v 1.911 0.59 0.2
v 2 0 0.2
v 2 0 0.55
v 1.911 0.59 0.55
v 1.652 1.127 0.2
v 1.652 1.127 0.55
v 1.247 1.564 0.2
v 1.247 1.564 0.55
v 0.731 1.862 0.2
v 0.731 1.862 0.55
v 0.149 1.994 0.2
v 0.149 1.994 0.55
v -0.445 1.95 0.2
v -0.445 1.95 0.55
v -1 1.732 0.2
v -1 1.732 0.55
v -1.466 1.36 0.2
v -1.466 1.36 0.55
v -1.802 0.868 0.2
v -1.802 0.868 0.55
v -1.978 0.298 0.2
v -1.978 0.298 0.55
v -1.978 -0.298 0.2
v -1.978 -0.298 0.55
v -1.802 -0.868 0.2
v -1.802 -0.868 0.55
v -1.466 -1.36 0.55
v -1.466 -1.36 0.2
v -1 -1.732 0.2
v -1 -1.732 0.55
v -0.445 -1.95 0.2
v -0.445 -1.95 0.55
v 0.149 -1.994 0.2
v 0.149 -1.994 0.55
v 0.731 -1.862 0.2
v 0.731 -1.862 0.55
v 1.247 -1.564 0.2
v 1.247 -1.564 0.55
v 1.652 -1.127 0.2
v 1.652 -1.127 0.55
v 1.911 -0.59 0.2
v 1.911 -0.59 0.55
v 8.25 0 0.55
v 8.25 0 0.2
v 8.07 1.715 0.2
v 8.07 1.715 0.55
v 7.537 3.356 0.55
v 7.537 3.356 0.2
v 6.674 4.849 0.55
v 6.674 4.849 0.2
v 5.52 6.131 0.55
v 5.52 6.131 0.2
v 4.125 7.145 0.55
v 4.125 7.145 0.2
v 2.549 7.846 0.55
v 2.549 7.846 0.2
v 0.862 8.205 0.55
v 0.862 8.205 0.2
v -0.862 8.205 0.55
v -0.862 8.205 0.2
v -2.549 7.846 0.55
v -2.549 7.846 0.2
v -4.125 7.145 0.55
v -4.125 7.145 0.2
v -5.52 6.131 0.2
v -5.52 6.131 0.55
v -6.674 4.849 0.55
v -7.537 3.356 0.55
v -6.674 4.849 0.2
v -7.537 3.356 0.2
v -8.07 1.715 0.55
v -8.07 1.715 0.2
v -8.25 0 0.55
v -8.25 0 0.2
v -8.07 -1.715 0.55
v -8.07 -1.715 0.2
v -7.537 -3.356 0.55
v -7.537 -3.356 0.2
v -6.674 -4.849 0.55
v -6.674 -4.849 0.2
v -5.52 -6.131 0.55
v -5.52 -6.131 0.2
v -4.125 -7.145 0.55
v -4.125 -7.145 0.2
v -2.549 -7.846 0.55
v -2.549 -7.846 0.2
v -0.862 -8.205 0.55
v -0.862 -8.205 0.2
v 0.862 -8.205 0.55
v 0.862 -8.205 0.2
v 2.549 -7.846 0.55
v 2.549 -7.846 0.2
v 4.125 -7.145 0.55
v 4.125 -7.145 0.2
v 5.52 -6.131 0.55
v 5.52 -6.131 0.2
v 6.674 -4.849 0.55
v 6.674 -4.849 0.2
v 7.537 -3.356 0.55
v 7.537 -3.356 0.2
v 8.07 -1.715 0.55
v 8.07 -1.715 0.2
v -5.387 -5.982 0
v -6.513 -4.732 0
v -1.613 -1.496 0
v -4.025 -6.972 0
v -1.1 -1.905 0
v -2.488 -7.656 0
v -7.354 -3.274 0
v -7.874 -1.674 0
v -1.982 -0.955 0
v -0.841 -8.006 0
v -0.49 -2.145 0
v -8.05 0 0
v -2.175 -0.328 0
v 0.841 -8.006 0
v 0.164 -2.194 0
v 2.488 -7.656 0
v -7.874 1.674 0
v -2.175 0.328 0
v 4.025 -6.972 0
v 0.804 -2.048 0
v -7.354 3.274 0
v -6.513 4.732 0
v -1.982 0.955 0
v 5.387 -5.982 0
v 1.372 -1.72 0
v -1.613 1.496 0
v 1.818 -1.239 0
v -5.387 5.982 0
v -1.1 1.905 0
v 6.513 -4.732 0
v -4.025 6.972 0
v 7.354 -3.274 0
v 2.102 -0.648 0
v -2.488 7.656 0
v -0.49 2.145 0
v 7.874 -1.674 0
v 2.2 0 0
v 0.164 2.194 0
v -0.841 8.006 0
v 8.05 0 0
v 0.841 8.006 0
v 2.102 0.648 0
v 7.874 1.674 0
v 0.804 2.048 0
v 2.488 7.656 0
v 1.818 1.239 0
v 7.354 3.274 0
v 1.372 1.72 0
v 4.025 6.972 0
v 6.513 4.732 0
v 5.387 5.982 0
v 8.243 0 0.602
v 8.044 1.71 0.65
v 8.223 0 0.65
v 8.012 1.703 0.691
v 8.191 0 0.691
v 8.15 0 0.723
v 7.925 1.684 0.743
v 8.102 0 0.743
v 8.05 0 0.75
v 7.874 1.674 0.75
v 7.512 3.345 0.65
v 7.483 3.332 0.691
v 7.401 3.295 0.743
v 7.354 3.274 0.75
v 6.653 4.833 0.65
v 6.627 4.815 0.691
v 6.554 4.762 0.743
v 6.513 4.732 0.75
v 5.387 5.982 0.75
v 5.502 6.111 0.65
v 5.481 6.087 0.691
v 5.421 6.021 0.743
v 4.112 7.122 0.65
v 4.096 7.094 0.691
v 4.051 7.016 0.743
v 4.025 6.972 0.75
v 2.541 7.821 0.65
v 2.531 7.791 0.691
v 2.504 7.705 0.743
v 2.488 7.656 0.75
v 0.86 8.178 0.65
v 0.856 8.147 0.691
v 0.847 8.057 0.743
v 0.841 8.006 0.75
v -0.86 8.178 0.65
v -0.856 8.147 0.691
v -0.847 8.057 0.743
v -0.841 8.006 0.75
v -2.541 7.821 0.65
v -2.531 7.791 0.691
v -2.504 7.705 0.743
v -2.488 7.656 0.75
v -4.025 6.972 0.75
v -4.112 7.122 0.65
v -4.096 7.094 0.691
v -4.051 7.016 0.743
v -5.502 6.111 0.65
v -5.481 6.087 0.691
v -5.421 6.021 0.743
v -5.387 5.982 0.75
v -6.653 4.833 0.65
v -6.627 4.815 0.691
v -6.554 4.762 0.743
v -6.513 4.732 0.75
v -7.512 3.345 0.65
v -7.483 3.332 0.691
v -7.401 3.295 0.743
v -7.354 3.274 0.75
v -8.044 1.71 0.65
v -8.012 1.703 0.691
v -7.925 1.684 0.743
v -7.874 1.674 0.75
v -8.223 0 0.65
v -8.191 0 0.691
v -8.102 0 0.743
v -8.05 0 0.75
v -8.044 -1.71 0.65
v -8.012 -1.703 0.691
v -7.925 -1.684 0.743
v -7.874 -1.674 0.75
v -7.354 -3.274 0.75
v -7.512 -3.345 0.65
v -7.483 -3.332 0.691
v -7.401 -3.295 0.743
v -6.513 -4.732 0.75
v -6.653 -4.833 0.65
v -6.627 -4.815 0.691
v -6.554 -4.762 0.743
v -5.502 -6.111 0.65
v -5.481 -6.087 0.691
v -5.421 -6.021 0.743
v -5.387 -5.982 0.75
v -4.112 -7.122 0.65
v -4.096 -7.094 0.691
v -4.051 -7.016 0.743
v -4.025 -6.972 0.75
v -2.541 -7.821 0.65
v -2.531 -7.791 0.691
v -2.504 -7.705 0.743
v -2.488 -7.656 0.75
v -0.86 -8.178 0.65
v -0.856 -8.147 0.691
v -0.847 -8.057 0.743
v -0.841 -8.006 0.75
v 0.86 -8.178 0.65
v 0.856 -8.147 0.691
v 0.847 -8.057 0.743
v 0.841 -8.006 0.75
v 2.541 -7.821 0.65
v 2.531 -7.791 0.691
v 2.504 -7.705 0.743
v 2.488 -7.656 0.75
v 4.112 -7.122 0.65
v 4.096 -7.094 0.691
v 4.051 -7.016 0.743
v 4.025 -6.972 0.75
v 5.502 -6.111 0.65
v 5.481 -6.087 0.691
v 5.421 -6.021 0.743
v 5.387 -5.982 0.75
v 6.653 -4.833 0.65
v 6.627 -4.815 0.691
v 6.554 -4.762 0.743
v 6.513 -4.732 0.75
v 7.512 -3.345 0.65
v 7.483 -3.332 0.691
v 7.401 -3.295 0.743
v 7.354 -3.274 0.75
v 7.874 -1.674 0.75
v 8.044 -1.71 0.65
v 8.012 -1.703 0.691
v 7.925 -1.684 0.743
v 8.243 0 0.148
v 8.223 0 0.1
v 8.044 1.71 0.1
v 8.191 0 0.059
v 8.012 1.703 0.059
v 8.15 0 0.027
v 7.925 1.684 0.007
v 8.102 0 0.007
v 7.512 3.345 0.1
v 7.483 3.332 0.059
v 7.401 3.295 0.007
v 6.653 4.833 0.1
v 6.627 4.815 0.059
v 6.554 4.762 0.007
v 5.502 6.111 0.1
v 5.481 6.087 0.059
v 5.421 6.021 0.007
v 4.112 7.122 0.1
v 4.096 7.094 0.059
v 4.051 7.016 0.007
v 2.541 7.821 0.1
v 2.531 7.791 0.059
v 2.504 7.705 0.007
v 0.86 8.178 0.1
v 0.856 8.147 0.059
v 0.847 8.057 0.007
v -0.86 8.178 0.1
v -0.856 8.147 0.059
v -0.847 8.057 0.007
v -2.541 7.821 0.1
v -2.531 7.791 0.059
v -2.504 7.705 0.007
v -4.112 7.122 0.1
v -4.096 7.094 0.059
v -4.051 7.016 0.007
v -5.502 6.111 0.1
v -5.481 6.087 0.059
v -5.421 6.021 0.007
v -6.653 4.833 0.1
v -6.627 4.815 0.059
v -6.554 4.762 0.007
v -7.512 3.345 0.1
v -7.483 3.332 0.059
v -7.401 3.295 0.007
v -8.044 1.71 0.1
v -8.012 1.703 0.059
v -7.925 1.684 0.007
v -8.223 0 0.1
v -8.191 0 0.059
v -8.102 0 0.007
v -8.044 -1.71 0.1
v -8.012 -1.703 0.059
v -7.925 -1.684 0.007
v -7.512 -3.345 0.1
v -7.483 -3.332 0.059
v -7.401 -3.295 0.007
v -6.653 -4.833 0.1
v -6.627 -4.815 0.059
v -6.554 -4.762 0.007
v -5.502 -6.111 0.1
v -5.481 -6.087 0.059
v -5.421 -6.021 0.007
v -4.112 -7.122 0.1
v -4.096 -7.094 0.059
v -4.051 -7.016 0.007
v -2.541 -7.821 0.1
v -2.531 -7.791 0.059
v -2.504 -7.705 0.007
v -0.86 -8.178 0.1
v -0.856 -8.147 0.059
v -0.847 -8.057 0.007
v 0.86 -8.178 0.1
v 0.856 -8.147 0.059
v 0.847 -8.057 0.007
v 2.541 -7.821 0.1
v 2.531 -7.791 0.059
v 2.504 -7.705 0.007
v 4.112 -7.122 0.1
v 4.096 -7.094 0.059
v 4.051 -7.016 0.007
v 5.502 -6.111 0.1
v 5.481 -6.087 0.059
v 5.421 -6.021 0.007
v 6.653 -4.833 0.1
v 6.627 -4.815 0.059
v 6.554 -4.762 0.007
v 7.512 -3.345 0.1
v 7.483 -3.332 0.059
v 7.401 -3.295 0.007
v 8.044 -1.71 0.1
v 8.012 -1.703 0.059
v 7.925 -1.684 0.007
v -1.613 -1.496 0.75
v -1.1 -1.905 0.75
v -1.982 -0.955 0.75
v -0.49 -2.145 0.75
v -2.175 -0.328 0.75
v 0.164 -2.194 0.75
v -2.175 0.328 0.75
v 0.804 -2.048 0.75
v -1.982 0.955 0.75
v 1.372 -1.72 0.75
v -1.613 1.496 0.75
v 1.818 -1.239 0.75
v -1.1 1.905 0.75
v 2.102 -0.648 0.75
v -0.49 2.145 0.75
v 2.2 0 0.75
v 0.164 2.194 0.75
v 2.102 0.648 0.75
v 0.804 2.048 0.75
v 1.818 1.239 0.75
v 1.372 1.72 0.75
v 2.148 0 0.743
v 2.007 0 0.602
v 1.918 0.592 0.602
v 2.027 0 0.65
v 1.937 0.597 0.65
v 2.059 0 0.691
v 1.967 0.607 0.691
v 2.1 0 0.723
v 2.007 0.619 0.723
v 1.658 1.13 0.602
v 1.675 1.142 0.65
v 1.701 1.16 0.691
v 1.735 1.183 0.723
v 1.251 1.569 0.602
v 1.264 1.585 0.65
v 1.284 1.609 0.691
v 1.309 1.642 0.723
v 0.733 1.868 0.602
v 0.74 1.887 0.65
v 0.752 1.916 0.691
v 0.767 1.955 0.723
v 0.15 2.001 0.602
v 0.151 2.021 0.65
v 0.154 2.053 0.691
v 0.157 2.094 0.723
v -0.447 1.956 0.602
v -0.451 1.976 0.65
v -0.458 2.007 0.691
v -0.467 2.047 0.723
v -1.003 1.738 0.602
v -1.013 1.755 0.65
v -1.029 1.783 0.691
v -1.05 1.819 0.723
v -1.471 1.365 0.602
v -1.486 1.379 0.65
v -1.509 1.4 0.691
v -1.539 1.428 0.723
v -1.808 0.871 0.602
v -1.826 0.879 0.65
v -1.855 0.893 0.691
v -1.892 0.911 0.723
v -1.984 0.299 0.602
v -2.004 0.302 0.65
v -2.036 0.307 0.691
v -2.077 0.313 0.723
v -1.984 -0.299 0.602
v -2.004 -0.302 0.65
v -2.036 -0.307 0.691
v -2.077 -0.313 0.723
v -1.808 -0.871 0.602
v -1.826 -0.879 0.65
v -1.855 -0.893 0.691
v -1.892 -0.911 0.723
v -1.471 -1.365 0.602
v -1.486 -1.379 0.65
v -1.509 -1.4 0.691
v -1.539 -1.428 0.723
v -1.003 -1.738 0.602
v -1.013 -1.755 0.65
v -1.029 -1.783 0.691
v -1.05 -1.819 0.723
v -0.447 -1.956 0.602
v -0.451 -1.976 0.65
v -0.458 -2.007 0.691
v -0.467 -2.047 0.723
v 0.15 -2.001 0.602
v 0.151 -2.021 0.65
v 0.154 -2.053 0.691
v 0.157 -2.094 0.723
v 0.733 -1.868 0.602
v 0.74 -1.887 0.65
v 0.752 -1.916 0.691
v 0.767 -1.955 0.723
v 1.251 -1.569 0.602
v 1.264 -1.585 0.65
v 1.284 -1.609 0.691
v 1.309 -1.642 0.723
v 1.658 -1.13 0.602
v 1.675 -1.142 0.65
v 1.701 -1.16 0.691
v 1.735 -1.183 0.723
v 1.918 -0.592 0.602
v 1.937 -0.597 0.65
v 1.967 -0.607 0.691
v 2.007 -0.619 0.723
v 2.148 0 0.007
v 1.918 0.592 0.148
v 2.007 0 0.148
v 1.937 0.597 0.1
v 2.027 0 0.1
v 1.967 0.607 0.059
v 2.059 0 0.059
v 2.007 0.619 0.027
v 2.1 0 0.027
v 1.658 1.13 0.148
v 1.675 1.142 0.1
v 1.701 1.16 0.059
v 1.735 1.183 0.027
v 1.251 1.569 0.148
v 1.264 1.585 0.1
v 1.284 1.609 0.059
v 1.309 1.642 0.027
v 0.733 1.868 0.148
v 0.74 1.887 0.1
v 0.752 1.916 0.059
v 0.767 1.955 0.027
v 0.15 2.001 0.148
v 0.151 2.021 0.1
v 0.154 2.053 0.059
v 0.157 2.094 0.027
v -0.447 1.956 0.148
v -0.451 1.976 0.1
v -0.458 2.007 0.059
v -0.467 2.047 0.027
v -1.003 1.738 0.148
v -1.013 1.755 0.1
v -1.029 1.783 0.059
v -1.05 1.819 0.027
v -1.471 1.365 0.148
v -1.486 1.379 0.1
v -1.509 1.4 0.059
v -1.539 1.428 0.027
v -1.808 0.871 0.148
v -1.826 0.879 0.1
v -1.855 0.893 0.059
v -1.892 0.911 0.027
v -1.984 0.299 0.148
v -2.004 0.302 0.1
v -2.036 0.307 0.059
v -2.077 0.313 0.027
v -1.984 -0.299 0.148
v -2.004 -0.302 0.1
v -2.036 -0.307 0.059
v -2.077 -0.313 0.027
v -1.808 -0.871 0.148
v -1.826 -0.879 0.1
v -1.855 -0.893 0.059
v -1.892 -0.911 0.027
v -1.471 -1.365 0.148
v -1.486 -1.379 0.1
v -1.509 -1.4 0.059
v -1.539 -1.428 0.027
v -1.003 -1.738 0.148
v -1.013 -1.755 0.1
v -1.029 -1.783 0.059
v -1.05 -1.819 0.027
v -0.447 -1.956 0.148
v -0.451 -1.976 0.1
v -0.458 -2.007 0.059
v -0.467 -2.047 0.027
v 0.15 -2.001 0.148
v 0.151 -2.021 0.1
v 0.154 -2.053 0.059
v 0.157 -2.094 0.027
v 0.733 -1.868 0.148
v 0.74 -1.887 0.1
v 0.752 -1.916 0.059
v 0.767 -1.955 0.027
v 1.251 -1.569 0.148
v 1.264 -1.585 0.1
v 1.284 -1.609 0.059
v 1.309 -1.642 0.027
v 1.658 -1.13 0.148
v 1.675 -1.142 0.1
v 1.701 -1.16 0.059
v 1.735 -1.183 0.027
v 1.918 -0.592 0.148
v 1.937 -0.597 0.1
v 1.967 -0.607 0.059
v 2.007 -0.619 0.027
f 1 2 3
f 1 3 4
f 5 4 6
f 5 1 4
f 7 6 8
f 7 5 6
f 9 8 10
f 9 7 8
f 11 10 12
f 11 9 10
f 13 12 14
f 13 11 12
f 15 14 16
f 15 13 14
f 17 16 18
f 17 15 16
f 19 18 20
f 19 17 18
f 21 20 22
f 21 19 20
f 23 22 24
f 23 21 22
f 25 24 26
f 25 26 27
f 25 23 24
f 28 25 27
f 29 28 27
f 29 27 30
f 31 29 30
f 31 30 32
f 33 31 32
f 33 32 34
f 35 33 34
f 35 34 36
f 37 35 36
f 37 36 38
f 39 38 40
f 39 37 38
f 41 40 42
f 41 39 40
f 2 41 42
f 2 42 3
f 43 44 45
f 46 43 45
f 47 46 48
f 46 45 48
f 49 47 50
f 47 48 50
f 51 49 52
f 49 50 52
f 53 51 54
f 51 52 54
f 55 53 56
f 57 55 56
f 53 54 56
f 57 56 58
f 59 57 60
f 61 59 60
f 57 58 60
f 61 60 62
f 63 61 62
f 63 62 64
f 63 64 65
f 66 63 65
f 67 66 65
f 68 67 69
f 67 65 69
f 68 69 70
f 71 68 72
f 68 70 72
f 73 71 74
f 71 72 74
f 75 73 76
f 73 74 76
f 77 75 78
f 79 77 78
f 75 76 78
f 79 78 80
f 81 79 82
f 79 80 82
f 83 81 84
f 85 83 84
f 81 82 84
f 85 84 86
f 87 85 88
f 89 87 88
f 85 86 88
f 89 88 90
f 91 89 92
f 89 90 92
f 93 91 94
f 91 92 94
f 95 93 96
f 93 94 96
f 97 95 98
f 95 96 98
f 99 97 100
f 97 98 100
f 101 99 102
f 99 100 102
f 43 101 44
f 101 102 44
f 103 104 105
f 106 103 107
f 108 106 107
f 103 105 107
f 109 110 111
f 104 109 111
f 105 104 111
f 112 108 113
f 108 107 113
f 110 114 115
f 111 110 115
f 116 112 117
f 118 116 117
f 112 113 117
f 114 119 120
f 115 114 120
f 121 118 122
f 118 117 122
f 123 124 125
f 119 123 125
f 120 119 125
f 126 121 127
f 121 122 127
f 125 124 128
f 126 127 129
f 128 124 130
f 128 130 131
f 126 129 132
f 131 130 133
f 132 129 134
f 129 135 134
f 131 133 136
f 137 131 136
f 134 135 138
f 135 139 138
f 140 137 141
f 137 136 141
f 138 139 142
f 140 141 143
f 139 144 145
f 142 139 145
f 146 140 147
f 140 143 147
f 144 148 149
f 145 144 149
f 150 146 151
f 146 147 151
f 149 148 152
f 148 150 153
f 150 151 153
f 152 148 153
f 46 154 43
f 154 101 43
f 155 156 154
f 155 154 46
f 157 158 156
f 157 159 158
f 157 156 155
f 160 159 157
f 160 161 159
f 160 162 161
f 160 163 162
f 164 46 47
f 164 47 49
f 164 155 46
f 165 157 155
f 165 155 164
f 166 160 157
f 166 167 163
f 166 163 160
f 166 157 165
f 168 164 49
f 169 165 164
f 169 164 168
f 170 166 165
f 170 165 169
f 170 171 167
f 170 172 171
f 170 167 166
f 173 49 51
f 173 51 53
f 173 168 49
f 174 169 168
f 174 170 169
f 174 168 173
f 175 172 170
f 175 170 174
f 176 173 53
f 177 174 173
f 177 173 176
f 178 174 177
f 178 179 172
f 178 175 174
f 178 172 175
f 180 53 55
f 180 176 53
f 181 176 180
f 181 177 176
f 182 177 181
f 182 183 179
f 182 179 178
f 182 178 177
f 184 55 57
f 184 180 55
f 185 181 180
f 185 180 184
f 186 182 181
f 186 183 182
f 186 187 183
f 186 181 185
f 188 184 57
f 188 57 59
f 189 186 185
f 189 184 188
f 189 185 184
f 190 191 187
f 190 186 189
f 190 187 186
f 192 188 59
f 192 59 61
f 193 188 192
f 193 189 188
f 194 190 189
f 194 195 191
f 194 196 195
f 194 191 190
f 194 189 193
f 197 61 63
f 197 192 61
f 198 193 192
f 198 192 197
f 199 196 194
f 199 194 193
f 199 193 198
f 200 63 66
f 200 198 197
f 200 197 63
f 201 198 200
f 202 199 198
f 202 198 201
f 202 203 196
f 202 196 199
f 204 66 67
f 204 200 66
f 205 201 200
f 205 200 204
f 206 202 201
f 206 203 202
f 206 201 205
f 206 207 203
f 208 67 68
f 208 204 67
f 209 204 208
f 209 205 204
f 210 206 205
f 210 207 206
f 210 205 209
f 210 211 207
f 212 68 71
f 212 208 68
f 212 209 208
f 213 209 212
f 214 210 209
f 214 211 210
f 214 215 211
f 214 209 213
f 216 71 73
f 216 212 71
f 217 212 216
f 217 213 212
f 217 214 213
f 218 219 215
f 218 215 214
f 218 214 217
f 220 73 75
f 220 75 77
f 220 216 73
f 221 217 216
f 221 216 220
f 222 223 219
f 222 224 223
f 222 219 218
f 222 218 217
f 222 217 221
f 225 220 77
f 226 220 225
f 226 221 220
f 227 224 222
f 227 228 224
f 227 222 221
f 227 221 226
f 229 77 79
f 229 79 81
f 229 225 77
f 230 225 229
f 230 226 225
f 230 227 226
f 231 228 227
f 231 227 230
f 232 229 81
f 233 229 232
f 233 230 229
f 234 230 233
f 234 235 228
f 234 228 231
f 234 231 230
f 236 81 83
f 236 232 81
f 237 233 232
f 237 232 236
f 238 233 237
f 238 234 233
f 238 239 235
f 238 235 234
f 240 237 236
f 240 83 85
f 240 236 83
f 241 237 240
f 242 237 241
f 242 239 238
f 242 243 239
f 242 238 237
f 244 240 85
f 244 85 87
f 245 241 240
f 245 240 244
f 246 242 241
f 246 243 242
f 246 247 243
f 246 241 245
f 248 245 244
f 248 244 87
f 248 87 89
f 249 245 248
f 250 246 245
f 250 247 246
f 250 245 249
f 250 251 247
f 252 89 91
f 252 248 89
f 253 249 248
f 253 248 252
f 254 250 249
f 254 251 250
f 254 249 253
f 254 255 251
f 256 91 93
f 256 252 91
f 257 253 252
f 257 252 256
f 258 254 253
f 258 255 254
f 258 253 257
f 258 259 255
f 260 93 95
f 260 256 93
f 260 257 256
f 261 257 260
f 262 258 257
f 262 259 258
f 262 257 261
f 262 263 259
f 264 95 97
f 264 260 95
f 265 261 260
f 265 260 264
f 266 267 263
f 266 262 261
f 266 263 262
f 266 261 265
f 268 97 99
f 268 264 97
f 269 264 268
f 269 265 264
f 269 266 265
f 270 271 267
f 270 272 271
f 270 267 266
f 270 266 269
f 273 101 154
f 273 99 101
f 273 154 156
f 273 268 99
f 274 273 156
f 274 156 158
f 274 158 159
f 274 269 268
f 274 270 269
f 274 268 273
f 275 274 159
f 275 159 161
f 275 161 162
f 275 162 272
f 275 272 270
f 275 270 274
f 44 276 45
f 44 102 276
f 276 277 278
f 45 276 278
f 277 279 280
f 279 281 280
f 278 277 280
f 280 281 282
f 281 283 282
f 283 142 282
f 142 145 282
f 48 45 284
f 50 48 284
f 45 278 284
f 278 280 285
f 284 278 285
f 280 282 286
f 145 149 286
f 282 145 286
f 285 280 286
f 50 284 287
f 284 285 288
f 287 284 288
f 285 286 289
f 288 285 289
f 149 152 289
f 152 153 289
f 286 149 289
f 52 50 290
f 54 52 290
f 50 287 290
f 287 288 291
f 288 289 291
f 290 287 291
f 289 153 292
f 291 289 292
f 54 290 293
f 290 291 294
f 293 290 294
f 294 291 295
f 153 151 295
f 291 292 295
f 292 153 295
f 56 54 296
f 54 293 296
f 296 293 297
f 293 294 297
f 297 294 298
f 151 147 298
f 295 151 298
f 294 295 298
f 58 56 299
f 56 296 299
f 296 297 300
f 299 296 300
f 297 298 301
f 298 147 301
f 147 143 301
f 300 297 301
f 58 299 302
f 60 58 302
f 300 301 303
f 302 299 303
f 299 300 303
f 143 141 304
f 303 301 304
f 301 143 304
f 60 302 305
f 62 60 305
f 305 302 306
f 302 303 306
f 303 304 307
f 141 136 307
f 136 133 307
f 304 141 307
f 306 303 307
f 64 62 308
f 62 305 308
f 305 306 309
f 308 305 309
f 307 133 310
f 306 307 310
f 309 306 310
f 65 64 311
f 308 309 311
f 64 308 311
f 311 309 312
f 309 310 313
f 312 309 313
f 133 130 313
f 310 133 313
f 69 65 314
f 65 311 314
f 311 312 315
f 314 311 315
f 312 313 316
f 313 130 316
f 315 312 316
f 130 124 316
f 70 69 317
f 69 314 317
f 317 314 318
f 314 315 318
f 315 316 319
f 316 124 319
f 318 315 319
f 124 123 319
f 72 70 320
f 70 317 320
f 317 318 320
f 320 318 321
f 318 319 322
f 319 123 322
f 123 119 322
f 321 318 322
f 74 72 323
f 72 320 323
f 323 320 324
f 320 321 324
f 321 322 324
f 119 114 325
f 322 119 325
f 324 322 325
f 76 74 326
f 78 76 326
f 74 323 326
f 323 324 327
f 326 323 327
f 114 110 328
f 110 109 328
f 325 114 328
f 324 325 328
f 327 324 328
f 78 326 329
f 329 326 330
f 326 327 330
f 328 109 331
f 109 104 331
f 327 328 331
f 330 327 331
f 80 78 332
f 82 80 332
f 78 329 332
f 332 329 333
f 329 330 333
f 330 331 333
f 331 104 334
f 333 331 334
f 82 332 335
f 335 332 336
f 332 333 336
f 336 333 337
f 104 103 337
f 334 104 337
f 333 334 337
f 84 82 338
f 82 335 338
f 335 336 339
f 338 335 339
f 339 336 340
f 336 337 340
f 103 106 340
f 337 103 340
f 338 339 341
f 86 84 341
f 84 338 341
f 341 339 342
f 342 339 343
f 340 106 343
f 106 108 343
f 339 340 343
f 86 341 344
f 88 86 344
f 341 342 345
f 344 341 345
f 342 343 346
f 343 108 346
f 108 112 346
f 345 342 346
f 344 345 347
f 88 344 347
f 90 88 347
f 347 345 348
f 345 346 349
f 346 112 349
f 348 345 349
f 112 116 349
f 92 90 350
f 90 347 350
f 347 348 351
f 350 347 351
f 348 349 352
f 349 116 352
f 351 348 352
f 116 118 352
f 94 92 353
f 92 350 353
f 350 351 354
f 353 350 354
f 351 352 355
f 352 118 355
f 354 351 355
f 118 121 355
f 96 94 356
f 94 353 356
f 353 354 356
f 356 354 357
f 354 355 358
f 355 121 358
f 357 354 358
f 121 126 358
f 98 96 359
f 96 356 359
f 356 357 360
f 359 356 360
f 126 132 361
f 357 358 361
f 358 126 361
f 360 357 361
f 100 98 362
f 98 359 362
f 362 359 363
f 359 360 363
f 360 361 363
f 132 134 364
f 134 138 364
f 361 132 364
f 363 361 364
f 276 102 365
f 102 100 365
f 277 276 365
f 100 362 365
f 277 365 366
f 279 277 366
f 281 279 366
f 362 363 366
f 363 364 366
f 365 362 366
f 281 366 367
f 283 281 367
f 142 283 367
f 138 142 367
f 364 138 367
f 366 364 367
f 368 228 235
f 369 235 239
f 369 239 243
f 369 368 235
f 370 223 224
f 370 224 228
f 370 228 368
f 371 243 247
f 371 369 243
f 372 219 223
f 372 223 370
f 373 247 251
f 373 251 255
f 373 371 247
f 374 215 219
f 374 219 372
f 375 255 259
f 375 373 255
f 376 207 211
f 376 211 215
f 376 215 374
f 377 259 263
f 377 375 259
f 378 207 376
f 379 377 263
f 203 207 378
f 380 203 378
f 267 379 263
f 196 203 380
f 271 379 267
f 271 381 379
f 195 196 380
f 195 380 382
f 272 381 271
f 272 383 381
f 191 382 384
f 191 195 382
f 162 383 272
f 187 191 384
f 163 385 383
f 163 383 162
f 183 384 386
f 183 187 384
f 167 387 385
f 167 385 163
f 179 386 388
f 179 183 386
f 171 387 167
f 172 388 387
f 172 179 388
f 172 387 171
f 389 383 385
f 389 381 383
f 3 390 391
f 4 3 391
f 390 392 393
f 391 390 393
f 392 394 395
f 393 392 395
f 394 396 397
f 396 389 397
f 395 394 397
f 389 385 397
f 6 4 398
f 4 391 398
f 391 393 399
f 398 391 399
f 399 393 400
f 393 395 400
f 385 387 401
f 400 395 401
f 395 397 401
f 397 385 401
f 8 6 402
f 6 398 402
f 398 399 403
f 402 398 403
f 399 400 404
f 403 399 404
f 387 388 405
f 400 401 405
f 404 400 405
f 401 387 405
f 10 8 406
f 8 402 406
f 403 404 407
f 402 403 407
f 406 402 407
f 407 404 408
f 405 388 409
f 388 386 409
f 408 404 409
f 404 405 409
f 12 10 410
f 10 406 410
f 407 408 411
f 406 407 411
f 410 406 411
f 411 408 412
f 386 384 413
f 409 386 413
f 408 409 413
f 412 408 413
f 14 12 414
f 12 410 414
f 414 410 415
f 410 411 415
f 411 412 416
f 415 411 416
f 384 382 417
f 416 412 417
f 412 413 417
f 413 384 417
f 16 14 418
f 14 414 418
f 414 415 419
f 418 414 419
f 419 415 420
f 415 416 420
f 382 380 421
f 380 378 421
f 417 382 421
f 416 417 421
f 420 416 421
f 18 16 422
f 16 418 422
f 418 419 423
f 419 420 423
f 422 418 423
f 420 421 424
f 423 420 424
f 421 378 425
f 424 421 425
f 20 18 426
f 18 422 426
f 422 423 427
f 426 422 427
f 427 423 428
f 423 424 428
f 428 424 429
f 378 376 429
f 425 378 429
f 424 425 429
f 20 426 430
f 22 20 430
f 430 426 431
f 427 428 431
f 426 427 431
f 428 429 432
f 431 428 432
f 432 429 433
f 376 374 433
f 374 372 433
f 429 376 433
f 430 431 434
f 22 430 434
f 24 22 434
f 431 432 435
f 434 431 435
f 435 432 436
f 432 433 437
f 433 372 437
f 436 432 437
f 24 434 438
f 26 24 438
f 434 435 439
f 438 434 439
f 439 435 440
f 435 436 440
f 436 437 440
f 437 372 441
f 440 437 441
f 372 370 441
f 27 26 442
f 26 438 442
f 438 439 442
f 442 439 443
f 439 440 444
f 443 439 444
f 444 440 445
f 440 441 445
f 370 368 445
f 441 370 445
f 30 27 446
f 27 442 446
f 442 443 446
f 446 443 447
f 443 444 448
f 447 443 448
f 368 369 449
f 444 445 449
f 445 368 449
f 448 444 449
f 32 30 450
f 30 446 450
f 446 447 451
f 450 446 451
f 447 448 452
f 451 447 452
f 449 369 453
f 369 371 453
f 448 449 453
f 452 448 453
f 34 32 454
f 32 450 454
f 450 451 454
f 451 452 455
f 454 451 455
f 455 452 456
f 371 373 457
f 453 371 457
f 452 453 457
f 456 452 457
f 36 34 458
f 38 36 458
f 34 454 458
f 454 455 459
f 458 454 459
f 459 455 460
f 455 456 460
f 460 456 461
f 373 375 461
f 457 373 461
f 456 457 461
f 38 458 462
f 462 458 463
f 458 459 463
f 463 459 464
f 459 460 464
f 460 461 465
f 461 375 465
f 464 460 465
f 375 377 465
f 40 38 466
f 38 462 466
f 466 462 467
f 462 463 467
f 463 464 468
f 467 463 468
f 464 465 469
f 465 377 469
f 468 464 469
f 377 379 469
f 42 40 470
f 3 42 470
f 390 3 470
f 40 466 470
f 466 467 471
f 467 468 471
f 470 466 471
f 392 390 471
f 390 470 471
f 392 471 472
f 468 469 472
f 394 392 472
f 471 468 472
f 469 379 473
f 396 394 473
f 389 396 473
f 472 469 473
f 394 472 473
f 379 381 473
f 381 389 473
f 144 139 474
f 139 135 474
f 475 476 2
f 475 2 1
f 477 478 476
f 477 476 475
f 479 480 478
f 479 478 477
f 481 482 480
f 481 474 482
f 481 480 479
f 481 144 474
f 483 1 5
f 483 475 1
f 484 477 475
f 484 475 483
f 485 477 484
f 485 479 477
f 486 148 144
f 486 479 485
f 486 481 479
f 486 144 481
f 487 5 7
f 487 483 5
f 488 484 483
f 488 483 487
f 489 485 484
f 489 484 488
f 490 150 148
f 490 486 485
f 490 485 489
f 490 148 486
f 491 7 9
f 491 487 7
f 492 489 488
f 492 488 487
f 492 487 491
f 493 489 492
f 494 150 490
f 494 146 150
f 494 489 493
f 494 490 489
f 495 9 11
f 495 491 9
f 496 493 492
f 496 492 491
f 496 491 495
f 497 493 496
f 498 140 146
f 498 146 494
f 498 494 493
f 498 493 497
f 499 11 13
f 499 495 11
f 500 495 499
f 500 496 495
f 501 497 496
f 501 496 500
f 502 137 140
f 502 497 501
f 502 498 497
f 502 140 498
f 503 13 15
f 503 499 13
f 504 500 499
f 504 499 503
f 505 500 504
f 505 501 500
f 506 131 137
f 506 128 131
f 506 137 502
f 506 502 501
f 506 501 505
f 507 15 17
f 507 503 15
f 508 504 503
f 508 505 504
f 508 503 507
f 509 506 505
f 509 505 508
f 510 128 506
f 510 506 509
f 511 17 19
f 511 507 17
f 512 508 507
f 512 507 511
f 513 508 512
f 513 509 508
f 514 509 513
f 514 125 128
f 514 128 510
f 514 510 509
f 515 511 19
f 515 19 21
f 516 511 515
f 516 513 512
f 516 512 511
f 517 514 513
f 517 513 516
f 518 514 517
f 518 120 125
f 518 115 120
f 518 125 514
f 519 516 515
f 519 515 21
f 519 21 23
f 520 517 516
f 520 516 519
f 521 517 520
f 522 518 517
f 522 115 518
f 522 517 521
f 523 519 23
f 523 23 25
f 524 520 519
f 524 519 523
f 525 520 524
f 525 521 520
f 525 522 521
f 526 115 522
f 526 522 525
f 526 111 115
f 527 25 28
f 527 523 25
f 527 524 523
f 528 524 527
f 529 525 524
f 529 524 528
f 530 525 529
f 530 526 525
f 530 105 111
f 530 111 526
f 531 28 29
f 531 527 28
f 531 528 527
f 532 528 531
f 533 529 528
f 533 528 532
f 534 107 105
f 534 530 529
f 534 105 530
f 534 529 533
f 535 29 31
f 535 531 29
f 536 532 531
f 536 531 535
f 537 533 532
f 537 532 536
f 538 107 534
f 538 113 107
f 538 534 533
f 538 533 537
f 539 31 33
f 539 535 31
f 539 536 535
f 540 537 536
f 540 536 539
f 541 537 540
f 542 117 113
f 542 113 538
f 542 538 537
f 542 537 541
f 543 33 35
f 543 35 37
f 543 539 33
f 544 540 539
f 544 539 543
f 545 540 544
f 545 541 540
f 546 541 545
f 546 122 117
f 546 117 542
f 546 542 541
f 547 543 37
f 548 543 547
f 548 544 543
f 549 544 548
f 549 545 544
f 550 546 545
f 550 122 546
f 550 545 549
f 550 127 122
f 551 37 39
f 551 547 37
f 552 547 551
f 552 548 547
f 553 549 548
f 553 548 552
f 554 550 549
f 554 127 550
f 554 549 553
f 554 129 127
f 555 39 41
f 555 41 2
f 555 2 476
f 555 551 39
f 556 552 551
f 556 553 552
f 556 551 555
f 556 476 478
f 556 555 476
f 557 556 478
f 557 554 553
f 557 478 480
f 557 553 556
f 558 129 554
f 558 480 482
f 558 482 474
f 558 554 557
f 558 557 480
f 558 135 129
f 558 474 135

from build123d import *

# Parameters (mm, degrees)
ESQUISSE1_R      = 8.25
ESQUISSE1_R_2    = 2
EXTRUSION1_DEPTH = 0.75
CONG_1_R         = 0.2


with BuildPart() as part:
    # Esquisse1 → Extrusion1 (new body)
    with BuildSketch(Plane.XY):
        Circle(ESQUISSE1_R)
        Circle(ESQUISSE1_R_2, mode=Mode.SUBTRACT)
    extrude(amount=EXTRUSION1_DEPTH)

    # Congé1
    cong_1_edges = [part.edges().sort_by_distance(p)[0] for p in [
        (-8.25, 0, 0),
        (-8.25, 0, 0.75),
        (-2, 0, 0),
        (-2, 0, 0.75),
    ]]
    fillet(cong_1_edges, radius=CONG_1_R)


solid = part.part
